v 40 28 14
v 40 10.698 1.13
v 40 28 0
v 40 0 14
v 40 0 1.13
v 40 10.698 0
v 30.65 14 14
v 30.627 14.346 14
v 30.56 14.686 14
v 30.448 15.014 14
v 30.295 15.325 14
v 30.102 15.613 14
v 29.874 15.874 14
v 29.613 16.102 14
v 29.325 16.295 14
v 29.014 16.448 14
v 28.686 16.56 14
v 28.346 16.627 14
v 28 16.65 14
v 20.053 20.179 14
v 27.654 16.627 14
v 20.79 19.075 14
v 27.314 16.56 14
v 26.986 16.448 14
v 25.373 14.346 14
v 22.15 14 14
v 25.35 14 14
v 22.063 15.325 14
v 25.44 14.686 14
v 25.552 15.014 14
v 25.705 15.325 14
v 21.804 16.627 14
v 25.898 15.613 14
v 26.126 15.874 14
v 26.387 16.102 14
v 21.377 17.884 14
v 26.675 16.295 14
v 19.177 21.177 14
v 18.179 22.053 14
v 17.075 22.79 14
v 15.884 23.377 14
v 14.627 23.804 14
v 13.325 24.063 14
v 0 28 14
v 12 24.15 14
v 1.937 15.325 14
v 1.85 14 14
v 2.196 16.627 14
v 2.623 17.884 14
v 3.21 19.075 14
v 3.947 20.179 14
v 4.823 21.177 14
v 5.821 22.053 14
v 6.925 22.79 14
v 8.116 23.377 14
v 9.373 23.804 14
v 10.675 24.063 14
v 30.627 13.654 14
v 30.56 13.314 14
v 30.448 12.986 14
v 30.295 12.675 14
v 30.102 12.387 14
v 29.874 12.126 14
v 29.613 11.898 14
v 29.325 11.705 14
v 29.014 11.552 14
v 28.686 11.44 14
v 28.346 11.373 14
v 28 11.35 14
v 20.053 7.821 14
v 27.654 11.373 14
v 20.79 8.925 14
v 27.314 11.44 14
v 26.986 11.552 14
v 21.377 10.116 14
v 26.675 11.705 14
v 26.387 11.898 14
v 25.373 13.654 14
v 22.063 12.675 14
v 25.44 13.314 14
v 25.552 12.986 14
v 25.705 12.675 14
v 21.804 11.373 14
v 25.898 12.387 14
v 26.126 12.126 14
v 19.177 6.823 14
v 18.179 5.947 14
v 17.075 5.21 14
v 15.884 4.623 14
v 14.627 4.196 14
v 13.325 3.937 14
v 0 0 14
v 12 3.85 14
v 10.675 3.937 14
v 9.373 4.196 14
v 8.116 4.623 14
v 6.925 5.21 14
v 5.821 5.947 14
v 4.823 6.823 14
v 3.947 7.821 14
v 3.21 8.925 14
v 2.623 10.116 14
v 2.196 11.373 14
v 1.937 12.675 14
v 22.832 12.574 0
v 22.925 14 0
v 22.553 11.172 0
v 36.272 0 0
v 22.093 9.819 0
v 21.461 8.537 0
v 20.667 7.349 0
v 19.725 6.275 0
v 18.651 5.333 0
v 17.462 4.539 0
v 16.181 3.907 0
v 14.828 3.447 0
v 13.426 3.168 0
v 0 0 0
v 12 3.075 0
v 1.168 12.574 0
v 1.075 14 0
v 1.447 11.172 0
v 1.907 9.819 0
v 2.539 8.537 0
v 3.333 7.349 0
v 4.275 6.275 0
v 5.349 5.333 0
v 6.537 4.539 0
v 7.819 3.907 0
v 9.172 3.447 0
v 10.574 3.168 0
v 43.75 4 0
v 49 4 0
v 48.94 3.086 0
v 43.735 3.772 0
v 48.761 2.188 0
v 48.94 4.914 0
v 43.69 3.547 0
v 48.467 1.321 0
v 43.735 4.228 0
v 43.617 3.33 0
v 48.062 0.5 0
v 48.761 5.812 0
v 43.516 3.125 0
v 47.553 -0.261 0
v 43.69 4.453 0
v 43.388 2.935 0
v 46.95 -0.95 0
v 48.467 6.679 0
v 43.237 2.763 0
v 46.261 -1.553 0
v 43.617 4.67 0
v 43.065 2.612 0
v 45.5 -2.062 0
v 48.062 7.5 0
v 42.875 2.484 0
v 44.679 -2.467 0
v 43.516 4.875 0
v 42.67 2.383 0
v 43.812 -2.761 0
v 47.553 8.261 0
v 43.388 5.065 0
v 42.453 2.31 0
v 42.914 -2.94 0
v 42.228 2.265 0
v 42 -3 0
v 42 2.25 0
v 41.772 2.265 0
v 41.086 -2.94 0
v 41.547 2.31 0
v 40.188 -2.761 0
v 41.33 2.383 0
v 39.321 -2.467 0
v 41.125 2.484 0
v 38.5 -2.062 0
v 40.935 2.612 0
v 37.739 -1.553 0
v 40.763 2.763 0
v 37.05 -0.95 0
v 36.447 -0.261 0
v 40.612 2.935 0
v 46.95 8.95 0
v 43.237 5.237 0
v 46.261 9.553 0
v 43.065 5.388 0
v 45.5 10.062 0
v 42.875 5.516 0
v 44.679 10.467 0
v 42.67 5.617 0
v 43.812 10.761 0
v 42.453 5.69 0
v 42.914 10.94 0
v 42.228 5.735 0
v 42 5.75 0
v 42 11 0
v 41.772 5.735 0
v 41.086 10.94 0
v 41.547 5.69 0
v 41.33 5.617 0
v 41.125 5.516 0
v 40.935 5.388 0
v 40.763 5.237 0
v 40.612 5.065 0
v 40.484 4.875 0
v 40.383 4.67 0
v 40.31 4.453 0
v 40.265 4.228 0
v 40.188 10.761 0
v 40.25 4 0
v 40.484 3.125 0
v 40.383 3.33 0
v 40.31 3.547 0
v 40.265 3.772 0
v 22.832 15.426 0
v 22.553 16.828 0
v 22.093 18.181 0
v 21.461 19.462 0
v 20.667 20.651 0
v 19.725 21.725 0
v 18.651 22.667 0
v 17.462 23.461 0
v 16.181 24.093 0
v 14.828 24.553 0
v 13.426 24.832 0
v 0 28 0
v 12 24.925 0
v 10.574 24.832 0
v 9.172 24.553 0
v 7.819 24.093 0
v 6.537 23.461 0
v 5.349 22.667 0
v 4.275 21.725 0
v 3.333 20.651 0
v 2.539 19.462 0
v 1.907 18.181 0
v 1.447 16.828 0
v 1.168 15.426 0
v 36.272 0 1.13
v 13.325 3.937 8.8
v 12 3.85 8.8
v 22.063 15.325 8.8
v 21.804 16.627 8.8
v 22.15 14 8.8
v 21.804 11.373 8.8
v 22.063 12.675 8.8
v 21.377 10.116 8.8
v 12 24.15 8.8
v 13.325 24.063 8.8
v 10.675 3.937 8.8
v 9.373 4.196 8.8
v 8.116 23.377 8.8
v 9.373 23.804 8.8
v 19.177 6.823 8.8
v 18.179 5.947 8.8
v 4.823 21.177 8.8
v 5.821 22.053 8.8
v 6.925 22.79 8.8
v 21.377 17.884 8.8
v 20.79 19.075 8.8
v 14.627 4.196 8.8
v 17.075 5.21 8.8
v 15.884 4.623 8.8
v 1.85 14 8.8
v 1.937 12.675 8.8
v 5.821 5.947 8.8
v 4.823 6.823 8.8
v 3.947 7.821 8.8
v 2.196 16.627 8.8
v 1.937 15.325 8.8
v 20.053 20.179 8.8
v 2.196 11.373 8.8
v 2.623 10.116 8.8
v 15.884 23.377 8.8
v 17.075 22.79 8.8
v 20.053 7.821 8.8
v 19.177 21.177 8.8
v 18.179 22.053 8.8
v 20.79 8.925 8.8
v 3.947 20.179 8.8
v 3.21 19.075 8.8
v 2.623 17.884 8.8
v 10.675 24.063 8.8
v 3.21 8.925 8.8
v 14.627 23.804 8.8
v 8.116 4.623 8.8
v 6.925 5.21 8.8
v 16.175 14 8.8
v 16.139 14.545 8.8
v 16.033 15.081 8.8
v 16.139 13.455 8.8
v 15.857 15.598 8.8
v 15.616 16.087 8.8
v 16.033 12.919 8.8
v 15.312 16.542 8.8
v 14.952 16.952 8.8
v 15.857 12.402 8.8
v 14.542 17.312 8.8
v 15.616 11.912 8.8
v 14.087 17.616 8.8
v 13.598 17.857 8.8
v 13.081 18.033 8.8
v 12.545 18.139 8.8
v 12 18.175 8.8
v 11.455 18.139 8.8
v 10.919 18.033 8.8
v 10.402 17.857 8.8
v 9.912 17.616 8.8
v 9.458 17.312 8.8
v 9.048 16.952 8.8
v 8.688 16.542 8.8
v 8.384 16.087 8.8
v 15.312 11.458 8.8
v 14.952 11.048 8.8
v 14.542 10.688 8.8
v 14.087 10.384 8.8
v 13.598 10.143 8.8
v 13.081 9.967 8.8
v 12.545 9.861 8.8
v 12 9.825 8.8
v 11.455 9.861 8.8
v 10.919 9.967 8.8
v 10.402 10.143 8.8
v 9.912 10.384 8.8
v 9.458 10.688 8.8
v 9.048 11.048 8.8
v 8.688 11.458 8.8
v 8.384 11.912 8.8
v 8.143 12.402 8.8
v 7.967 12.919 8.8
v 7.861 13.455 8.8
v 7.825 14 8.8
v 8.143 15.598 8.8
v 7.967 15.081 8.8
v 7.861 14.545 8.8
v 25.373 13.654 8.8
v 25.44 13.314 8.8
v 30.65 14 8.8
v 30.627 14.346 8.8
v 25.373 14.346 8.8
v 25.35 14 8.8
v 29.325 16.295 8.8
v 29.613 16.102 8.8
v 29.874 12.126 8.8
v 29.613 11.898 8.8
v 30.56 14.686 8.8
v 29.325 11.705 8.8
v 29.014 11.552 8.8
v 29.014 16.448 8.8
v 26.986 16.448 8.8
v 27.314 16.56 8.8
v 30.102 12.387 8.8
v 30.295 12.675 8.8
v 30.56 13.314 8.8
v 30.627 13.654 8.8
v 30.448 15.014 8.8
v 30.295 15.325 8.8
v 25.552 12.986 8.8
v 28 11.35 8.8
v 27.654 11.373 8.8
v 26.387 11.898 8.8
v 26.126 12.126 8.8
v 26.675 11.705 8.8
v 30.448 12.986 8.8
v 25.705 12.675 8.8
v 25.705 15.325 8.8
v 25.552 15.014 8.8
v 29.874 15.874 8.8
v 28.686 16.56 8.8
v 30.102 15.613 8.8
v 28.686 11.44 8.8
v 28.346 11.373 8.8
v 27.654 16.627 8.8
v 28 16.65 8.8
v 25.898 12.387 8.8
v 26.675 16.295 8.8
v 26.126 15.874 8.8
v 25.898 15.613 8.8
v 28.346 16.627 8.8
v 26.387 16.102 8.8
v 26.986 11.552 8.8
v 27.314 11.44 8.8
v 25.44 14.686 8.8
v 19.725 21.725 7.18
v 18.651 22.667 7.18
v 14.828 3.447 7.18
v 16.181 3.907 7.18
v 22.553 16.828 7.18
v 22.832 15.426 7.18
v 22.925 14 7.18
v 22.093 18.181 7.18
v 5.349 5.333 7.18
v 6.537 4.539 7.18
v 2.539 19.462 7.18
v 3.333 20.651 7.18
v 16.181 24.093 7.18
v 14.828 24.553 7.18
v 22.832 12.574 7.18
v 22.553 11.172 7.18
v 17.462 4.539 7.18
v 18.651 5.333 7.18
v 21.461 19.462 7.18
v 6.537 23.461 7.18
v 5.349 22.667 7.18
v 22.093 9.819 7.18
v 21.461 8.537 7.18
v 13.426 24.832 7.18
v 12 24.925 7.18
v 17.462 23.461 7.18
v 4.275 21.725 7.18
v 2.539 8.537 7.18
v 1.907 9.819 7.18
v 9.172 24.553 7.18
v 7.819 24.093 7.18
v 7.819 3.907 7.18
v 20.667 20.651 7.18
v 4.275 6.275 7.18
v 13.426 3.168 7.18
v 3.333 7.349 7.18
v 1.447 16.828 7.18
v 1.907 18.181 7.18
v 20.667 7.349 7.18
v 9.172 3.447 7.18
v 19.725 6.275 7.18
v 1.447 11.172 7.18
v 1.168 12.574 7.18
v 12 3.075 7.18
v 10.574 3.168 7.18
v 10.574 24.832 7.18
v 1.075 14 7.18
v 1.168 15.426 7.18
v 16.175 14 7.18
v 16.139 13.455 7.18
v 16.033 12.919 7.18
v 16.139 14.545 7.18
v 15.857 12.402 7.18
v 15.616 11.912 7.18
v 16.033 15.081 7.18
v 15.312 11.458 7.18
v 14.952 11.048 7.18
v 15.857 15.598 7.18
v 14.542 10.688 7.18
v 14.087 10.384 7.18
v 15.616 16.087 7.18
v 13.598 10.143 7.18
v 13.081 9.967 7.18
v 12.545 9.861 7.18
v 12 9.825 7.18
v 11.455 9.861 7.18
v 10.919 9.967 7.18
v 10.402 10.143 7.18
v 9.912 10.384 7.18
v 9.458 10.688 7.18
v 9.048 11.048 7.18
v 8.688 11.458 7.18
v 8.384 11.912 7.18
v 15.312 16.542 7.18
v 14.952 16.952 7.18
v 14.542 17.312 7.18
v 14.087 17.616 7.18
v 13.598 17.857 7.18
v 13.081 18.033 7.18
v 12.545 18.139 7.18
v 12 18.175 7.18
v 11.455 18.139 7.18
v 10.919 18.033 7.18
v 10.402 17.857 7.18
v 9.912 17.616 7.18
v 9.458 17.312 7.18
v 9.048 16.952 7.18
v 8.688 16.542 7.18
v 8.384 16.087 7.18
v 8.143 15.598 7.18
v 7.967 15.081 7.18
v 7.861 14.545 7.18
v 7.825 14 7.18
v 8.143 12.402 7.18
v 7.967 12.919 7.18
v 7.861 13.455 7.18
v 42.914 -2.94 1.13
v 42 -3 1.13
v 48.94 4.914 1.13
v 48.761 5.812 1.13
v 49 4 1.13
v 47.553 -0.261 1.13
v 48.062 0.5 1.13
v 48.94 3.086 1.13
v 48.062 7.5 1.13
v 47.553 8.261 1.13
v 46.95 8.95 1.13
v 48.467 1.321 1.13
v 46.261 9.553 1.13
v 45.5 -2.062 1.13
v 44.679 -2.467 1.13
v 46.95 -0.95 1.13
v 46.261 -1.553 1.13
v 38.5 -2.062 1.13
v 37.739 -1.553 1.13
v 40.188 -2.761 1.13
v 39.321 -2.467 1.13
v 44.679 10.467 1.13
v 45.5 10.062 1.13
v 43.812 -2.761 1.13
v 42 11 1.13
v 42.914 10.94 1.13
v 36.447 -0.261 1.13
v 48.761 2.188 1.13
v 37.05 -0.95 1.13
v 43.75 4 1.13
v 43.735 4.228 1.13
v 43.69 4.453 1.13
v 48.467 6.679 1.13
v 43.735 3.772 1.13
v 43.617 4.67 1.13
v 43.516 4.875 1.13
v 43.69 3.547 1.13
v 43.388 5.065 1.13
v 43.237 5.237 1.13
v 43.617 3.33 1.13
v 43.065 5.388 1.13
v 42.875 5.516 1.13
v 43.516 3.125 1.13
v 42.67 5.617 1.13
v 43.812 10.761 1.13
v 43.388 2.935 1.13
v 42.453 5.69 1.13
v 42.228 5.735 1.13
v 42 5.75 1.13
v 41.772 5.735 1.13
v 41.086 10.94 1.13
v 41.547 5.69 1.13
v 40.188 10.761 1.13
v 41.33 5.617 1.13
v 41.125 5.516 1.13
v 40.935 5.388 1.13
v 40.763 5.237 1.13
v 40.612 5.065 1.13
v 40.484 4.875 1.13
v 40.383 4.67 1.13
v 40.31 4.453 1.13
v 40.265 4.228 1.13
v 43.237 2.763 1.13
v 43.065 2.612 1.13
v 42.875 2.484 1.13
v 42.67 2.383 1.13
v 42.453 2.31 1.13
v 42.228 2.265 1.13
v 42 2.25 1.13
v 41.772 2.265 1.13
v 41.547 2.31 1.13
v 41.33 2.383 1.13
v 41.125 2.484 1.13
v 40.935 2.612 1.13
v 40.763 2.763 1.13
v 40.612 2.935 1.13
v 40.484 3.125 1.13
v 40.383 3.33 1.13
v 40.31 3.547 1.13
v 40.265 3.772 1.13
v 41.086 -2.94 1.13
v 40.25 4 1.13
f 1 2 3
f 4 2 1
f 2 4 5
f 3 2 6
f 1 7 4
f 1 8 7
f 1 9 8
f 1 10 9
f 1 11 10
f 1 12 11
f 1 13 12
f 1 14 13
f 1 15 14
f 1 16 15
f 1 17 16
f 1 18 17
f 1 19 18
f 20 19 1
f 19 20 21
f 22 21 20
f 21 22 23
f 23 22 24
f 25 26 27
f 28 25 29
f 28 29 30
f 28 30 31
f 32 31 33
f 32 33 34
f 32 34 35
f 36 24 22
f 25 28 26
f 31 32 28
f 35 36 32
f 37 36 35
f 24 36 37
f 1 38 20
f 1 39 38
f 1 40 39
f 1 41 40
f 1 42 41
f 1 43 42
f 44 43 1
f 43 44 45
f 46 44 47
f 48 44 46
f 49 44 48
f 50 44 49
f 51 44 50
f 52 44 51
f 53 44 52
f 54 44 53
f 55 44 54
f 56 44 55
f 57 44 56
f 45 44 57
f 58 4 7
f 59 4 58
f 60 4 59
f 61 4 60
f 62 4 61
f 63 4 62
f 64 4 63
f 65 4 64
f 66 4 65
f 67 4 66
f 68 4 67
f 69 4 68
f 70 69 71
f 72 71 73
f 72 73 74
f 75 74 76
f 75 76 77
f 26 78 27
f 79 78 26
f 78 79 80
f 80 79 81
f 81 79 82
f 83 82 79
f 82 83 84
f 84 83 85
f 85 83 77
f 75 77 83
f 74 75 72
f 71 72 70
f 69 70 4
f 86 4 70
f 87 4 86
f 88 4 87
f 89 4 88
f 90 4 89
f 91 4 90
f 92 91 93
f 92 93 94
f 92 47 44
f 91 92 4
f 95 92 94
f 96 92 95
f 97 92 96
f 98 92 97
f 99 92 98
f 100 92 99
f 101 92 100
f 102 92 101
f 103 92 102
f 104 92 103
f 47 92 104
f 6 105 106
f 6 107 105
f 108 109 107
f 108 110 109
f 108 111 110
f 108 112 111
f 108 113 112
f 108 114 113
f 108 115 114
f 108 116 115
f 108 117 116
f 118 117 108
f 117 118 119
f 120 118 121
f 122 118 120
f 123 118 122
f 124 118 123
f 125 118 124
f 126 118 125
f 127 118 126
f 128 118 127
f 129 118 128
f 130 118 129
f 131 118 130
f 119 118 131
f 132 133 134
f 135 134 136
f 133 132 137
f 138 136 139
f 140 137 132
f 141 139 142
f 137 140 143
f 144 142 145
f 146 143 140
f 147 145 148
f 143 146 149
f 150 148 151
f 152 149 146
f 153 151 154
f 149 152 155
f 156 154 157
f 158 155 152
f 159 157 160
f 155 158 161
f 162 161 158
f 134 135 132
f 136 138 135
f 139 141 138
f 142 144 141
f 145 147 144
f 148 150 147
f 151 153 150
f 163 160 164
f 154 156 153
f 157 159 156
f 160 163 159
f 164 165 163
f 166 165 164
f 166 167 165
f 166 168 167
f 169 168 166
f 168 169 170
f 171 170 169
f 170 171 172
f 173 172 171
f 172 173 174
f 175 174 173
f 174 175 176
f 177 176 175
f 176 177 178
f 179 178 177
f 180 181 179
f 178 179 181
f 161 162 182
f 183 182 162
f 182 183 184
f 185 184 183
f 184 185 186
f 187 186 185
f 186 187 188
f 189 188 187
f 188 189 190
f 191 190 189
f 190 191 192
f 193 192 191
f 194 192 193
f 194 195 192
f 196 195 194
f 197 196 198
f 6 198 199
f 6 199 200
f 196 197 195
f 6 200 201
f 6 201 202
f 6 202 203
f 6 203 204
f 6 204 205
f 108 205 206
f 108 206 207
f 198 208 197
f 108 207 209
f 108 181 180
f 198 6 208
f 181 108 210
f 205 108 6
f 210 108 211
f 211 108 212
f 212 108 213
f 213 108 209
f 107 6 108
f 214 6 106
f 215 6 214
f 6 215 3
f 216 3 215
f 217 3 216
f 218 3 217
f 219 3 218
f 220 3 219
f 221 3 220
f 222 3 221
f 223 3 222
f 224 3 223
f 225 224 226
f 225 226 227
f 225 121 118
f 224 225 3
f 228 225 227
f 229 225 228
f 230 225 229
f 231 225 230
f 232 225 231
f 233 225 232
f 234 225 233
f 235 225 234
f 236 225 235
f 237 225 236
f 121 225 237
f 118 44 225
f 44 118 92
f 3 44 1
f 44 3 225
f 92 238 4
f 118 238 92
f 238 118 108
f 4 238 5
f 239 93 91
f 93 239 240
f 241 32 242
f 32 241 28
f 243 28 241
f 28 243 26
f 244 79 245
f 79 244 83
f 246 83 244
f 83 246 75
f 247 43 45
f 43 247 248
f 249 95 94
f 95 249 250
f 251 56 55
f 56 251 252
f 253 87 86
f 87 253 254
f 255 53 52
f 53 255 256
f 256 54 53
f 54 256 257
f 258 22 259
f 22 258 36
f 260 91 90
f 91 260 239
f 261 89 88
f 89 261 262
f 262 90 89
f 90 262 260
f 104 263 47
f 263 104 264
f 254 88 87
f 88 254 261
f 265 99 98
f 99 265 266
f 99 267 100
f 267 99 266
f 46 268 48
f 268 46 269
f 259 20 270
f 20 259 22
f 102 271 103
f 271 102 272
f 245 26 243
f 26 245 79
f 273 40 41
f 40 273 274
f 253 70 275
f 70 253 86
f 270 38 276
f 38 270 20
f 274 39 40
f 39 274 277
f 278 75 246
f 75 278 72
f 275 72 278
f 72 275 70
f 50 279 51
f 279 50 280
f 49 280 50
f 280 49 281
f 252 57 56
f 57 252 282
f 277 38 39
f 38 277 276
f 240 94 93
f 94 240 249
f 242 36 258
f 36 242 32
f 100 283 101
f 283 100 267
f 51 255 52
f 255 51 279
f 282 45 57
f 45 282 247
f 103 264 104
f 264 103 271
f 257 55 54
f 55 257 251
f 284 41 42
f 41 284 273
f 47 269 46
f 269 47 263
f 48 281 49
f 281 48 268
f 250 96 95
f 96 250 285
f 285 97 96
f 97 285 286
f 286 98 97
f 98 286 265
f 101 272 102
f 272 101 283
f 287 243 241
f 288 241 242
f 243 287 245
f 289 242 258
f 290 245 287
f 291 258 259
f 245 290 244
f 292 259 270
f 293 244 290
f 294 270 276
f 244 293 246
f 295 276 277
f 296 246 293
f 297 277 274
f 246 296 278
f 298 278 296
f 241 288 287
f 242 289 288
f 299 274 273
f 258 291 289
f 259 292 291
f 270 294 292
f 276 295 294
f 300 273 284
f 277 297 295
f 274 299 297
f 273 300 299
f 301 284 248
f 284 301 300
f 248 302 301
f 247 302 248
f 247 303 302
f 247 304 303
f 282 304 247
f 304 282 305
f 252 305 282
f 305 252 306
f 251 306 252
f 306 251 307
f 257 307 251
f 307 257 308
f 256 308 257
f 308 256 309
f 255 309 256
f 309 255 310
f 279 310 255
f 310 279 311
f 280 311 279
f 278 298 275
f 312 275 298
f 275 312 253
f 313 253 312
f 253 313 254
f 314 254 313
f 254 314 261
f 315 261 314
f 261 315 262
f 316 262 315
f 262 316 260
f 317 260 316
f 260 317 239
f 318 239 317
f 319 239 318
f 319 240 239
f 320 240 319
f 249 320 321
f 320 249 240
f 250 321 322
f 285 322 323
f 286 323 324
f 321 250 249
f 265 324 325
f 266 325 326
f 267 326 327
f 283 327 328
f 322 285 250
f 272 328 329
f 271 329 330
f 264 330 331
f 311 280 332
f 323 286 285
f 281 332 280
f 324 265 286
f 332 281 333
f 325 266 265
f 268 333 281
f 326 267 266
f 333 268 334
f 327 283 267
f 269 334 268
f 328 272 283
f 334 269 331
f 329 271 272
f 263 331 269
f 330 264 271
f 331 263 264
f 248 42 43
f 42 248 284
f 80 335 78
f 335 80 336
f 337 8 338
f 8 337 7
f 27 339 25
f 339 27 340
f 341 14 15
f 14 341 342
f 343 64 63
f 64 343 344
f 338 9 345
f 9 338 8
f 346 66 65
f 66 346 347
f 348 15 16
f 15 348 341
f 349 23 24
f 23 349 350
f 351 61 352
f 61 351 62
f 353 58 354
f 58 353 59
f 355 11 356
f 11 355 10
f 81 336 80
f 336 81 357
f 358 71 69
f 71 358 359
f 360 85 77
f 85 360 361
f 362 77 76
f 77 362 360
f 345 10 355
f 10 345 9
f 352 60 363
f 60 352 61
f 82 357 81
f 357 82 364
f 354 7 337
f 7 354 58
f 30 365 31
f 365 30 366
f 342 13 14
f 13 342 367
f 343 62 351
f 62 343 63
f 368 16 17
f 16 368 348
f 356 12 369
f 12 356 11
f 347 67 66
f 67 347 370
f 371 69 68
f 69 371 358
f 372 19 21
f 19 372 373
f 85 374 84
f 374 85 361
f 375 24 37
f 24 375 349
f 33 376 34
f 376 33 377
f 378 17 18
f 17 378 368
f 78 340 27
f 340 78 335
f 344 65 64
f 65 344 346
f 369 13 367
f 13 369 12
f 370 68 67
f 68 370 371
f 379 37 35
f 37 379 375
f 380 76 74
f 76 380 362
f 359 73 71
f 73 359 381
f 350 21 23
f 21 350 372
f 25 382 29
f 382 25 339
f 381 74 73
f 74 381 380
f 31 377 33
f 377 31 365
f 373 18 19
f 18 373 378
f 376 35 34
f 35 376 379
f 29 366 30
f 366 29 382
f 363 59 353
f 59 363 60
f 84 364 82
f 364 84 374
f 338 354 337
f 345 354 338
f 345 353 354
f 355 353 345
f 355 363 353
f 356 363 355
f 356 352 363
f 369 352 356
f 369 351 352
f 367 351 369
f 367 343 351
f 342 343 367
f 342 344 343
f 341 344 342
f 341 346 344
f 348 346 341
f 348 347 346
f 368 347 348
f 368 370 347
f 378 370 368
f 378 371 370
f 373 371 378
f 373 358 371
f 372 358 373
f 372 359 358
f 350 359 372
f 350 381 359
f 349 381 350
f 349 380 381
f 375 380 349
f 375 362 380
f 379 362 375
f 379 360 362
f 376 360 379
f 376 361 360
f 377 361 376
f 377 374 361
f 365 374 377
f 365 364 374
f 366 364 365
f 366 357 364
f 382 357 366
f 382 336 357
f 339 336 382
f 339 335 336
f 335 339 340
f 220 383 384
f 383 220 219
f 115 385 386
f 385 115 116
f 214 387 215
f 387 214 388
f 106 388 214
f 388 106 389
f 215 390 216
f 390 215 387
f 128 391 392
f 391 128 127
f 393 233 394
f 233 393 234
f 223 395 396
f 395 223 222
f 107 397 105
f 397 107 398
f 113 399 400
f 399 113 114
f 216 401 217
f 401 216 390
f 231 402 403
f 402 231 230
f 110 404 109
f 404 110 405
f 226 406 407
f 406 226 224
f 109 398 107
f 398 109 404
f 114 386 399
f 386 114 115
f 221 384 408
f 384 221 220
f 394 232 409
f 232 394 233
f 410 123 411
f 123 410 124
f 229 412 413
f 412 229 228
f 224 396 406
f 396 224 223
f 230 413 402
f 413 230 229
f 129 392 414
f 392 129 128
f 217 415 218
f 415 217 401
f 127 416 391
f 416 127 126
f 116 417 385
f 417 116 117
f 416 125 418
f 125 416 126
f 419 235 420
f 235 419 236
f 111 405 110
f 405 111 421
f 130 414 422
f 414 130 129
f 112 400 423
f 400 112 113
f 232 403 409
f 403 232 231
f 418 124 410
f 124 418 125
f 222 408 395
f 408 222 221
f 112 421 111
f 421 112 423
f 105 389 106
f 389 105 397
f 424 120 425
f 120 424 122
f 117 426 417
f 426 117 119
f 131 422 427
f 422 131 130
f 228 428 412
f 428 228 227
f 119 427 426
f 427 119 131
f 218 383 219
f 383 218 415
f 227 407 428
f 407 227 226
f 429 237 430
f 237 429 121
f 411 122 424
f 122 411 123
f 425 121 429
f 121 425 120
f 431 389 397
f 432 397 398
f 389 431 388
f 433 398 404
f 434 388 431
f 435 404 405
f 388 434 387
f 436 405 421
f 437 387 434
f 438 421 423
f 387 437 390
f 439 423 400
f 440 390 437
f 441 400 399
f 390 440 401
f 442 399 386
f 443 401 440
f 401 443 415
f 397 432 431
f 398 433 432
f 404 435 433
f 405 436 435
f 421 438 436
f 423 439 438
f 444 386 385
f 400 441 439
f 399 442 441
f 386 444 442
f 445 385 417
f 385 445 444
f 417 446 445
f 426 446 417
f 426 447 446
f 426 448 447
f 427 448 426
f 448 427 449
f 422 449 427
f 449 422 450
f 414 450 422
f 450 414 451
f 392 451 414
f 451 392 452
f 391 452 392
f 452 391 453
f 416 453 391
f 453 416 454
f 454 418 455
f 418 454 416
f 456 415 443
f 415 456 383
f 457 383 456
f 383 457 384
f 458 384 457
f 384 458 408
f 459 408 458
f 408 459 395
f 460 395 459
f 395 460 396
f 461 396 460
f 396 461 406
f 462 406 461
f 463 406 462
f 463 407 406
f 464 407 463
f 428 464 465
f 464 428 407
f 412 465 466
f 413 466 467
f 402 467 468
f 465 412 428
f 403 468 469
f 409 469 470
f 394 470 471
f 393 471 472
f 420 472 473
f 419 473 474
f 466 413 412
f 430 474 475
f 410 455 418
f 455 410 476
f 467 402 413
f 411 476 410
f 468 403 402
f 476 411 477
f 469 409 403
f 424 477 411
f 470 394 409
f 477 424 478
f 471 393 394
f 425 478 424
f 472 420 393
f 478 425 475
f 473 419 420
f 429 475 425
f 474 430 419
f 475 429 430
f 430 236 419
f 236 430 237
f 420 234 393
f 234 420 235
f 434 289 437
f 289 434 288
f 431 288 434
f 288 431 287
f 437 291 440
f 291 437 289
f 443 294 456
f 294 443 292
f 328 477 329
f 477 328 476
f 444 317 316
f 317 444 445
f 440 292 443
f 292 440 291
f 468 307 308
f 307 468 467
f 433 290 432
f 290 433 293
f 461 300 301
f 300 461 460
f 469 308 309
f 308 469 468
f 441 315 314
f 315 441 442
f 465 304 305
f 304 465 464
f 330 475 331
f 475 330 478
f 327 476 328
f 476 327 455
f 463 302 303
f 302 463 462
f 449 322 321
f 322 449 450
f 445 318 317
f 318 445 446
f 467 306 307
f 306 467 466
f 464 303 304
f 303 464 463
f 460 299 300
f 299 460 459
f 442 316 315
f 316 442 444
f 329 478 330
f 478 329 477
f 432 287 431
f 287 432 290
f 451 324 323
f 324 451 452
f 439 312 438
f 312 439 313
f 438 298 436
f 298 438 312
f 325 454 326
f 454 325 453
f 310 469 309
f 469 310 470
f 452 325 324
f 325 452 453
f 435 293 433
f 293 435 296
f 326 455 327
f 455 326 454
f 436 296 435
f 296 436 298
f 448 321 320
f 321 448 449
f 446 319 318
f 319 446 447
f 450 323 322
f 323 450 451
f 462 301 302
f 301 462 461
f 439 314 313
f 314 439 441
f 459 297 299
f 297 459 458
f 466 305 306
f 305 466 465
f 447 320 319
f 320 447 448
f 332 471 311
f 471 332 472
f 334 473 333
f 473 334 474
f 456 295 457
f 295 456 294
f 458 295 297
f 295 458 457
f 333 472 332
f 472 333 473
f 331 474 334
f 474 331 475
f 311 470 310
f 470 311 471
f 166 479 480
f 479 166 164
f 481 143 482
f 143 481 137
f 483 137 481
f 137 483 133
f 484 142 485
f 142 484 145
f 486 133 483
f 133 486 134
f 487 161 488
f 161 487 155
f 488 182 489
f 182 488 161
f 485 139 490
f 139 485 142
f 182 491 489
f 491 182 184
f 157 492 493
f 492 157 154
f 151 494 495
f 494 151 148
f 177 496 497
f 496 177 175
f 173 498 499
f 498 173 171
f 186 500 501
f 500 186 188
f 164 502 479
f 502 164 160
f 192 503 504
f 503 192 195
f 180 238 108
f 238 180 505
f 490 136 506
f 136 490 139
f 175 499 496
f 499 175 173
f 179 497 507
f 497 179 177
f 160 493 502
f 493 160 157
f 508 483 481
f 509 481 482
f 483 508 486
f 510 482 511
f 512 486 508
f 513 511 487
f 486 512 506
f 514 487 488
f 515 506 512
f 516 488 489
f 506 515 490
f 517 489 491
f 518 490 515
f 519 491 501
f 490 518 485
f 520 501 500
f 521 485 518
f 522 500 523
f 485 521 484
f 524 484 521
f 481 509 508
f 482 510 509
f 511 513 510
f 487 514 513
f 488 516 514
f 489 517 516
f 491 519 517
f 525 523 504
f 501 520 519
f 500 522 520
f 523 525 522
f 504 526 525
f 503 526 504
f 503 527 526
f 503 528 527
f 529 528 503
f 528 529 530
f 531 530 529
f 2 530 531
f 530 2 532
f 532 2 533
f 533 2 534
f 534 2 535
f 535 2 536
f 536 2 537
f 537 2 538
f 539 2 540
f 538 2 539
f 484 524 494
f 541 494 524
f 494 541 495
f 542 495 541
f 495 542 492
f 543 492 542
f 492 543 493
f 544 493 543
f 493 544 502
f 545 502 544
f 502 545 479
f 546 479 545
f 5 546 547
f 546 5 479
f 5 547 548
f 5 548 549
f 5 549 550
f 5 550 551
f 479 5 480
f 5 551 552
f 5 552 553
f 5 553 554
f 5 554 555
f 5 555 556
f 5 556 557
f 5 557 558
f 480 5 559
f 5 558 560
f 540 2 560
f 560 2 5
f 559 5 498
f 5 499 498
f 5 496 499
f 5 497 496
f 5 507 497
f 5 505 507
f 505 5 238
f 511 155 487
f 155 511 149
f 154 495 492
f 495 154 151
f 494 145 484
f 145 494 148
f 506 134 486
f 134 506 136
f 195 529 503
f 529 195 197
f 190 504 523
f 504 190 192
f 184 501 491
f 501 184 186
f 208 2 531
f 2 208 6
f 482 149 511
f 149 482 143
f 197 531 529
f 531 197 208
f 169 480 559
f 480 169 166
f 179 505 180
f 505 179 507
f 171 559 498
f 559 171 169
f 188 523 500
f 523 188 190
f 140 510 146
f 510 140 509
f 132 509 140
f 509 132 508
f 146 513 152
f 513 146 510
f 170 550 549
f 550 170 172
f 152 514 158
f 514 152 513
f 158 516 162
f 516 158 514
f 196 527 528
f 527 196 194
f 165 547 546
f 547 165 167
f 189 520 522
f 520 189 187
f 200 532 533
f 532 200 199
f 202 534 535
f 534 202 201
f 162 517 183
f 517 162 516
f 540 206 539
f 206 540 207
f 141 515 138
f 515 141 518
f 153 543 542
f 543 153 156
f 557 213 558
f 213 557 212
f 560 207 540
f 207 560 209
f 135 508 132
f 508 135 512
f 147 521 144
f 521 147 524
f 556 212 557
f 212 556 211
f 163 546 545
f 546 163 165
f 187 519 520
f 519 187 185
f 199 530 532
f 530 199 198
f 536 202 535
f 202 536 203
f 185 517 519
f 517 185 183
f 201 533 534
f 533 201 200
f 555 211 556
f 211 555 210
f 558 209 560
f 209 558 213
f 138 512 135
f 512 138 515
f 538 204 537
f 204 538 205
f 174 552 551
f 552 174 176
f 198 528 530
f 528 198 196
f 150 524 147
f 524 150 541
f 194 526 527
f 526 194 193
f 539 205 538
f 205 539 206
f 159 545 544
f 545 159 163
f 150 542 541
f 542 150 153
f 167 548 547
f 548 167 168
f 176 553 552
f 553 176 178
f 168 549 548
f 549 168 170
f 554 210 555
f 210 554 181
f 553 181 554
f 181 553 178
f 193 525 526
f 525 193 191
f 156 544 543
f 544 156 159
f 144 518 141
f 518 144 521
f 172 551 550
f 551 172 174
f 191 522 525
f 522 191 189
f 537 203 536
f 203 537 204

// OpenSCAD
// file: parameters.scad
// =============================================================================
// Gen-AQ Dual-rotor copper-centroid ultra AFPM - WOUND-AWARE (HARD GATE)
// PRIMARY challenger vs Gen-AN. Magnets @ R=39.0 + 205 t + former_web 1.25 -> m2m 4.71.
// =============================================================================

// --- Wire / wind budget (26 AWG, ~1 lb spool ~ 390 m bare-equiv) --------------
wire_awg            = 26;
wire_od             = 0.45;     // insulated OD mm
turns               = 205;      // +5 vs Gen-AN 200
fill                = 0.70;
layers_per_face     = 2;        // axial layers proud of EACH flange
wind_build_axial    = layers_per_face * wire_od * fill;   // 0.63 mm
wind_build_radial   = 3 * wire_od * fill;                 // 0.945 mm

// --- Pancake former (bare STL) -----------------------------------------------
coil_id_r           = 15.0;     // copper-centroid window centered ~R=39.0
coil_od_r           = 63.0;
span_deg            = 26.0;     // 12 stations x 30 deg pitch
former_web          = 1.25;     // thinner vs AN 1.30 (print-safe >=1.20 LB)
flange_t            = 0.60;
wall                = 1.2;
slot_w              = 2.4;
mount_hole          = 3.5;
tab_len             = 7.0;

former_bare_h       = former_web + 2 * flange_t;            // 2.45 mm
coil_envelope_h     = former_bare_h + 2 * wind_build_axial; // 3.71 mm

// --- Running clearance (magnet face -> WOUND face) EACH side ------------------
run_clear           = 0.50;     // PASS floor >= 0.5
gap_spacer_h        = run_clear + wind_build_axial;         // 1.13 mm
m2m                 = coil_envelope_h + 2 * run_clear;      // 4.71 mm (beats Gen-AN 4.76)

// --- Mid stator (12 pancakes 3ph; winds proud both faces) ---------------------
coil_stations       = 12;
bay_r_in            = coil_id_r - 2.0 - wind_build_radial;
bay_r_out           = coil_od_r + 2.0 + wind_build_radial;
bay_span            = span_deg + 4.0;
bay_offset          = 2.0;
stator_thick        = former_bare_h;                        // winds proud +/-Z
stator_od           = 160.0;
shaft_clear_stator  = 34.0;
coil_mount_r        = 25.0;

// --- Rotors (x2) - 8xO20 @ R=39.0 (copper centroid) + 24xO5 Halbach ----------
large_pocket_d      = 20.3;
small_pocket_d      = 5.3;
pocket_h            = 5.2;
large_n             = 8;
R_large             = 39.0;     // covers ~29-49 over copper centroid ~39.0
R_small_inner       = 24.0;
R_small_mid         = 39.0;
R_small_outer       = 56.0;
carrier_od          = 156.0;
carrier_thick       = 7.5;
hub_h               = 10.0;
hub_od              = 30.0;
rotor_b_offset_deg  = 22.5;

// --- Modular MAX interface (Gen-E family) ------------------------------------
shaft_bore          = 8.35;
bearing_d           = 21.85;
bearing_h           = 7.2;
m3_clear            = 3.5;
bolt_r_inner        = 36.0;
bolt_n_inner        = 6;
flange_bolt_r       = 72.0;
flange_bolt_n       = 6;
brace_r             = 68.0;
brace_d             = 4.3;
brace_n             = 4;

spacer_pad_od       = 14.0;
spacer_pad_id       = m3_clear;
endbell_od          = 160.0;
endbell_thick       = 8.0;
endbell_shaft_clear = 10.0;

$fn = 64;
// main file
// Gen-AQ fit coupon — magnet pockets + 608 + spacer height
include <parameters.scad>;
$fn = 48;
block_w = 40; block_d = 28; block_h = 14;
difference() {
    cube([block_w, block_d, block_h]);
    translate([12, block_d/2, block_h - pocket_h])
        cylinder(d=large_pocket_d, h=pocket_h + 0.2);
    translate([28, block_d/2, block_h - pocket_h])
        cylinder(d=small_pocket_d, h=pocket_h + 0.2);
    translate([12, block_d/2, -0.02])
        cylinder(d=bearing_d, h=bearing_h);
    translate([12, block_d/2, -0.1])
        cylinder(d=shaft_bore, h=block_h + 1);
}
translate([block_w + 2, 4, 0])
    difference() {
        cylinder(d=spacer_pad_od, h=gap_spacer_h);
        translate([0, 0, -0.1]) cylinder(d=spacer_pad_id, h=gap_spacer_h + 0.2);
    }
